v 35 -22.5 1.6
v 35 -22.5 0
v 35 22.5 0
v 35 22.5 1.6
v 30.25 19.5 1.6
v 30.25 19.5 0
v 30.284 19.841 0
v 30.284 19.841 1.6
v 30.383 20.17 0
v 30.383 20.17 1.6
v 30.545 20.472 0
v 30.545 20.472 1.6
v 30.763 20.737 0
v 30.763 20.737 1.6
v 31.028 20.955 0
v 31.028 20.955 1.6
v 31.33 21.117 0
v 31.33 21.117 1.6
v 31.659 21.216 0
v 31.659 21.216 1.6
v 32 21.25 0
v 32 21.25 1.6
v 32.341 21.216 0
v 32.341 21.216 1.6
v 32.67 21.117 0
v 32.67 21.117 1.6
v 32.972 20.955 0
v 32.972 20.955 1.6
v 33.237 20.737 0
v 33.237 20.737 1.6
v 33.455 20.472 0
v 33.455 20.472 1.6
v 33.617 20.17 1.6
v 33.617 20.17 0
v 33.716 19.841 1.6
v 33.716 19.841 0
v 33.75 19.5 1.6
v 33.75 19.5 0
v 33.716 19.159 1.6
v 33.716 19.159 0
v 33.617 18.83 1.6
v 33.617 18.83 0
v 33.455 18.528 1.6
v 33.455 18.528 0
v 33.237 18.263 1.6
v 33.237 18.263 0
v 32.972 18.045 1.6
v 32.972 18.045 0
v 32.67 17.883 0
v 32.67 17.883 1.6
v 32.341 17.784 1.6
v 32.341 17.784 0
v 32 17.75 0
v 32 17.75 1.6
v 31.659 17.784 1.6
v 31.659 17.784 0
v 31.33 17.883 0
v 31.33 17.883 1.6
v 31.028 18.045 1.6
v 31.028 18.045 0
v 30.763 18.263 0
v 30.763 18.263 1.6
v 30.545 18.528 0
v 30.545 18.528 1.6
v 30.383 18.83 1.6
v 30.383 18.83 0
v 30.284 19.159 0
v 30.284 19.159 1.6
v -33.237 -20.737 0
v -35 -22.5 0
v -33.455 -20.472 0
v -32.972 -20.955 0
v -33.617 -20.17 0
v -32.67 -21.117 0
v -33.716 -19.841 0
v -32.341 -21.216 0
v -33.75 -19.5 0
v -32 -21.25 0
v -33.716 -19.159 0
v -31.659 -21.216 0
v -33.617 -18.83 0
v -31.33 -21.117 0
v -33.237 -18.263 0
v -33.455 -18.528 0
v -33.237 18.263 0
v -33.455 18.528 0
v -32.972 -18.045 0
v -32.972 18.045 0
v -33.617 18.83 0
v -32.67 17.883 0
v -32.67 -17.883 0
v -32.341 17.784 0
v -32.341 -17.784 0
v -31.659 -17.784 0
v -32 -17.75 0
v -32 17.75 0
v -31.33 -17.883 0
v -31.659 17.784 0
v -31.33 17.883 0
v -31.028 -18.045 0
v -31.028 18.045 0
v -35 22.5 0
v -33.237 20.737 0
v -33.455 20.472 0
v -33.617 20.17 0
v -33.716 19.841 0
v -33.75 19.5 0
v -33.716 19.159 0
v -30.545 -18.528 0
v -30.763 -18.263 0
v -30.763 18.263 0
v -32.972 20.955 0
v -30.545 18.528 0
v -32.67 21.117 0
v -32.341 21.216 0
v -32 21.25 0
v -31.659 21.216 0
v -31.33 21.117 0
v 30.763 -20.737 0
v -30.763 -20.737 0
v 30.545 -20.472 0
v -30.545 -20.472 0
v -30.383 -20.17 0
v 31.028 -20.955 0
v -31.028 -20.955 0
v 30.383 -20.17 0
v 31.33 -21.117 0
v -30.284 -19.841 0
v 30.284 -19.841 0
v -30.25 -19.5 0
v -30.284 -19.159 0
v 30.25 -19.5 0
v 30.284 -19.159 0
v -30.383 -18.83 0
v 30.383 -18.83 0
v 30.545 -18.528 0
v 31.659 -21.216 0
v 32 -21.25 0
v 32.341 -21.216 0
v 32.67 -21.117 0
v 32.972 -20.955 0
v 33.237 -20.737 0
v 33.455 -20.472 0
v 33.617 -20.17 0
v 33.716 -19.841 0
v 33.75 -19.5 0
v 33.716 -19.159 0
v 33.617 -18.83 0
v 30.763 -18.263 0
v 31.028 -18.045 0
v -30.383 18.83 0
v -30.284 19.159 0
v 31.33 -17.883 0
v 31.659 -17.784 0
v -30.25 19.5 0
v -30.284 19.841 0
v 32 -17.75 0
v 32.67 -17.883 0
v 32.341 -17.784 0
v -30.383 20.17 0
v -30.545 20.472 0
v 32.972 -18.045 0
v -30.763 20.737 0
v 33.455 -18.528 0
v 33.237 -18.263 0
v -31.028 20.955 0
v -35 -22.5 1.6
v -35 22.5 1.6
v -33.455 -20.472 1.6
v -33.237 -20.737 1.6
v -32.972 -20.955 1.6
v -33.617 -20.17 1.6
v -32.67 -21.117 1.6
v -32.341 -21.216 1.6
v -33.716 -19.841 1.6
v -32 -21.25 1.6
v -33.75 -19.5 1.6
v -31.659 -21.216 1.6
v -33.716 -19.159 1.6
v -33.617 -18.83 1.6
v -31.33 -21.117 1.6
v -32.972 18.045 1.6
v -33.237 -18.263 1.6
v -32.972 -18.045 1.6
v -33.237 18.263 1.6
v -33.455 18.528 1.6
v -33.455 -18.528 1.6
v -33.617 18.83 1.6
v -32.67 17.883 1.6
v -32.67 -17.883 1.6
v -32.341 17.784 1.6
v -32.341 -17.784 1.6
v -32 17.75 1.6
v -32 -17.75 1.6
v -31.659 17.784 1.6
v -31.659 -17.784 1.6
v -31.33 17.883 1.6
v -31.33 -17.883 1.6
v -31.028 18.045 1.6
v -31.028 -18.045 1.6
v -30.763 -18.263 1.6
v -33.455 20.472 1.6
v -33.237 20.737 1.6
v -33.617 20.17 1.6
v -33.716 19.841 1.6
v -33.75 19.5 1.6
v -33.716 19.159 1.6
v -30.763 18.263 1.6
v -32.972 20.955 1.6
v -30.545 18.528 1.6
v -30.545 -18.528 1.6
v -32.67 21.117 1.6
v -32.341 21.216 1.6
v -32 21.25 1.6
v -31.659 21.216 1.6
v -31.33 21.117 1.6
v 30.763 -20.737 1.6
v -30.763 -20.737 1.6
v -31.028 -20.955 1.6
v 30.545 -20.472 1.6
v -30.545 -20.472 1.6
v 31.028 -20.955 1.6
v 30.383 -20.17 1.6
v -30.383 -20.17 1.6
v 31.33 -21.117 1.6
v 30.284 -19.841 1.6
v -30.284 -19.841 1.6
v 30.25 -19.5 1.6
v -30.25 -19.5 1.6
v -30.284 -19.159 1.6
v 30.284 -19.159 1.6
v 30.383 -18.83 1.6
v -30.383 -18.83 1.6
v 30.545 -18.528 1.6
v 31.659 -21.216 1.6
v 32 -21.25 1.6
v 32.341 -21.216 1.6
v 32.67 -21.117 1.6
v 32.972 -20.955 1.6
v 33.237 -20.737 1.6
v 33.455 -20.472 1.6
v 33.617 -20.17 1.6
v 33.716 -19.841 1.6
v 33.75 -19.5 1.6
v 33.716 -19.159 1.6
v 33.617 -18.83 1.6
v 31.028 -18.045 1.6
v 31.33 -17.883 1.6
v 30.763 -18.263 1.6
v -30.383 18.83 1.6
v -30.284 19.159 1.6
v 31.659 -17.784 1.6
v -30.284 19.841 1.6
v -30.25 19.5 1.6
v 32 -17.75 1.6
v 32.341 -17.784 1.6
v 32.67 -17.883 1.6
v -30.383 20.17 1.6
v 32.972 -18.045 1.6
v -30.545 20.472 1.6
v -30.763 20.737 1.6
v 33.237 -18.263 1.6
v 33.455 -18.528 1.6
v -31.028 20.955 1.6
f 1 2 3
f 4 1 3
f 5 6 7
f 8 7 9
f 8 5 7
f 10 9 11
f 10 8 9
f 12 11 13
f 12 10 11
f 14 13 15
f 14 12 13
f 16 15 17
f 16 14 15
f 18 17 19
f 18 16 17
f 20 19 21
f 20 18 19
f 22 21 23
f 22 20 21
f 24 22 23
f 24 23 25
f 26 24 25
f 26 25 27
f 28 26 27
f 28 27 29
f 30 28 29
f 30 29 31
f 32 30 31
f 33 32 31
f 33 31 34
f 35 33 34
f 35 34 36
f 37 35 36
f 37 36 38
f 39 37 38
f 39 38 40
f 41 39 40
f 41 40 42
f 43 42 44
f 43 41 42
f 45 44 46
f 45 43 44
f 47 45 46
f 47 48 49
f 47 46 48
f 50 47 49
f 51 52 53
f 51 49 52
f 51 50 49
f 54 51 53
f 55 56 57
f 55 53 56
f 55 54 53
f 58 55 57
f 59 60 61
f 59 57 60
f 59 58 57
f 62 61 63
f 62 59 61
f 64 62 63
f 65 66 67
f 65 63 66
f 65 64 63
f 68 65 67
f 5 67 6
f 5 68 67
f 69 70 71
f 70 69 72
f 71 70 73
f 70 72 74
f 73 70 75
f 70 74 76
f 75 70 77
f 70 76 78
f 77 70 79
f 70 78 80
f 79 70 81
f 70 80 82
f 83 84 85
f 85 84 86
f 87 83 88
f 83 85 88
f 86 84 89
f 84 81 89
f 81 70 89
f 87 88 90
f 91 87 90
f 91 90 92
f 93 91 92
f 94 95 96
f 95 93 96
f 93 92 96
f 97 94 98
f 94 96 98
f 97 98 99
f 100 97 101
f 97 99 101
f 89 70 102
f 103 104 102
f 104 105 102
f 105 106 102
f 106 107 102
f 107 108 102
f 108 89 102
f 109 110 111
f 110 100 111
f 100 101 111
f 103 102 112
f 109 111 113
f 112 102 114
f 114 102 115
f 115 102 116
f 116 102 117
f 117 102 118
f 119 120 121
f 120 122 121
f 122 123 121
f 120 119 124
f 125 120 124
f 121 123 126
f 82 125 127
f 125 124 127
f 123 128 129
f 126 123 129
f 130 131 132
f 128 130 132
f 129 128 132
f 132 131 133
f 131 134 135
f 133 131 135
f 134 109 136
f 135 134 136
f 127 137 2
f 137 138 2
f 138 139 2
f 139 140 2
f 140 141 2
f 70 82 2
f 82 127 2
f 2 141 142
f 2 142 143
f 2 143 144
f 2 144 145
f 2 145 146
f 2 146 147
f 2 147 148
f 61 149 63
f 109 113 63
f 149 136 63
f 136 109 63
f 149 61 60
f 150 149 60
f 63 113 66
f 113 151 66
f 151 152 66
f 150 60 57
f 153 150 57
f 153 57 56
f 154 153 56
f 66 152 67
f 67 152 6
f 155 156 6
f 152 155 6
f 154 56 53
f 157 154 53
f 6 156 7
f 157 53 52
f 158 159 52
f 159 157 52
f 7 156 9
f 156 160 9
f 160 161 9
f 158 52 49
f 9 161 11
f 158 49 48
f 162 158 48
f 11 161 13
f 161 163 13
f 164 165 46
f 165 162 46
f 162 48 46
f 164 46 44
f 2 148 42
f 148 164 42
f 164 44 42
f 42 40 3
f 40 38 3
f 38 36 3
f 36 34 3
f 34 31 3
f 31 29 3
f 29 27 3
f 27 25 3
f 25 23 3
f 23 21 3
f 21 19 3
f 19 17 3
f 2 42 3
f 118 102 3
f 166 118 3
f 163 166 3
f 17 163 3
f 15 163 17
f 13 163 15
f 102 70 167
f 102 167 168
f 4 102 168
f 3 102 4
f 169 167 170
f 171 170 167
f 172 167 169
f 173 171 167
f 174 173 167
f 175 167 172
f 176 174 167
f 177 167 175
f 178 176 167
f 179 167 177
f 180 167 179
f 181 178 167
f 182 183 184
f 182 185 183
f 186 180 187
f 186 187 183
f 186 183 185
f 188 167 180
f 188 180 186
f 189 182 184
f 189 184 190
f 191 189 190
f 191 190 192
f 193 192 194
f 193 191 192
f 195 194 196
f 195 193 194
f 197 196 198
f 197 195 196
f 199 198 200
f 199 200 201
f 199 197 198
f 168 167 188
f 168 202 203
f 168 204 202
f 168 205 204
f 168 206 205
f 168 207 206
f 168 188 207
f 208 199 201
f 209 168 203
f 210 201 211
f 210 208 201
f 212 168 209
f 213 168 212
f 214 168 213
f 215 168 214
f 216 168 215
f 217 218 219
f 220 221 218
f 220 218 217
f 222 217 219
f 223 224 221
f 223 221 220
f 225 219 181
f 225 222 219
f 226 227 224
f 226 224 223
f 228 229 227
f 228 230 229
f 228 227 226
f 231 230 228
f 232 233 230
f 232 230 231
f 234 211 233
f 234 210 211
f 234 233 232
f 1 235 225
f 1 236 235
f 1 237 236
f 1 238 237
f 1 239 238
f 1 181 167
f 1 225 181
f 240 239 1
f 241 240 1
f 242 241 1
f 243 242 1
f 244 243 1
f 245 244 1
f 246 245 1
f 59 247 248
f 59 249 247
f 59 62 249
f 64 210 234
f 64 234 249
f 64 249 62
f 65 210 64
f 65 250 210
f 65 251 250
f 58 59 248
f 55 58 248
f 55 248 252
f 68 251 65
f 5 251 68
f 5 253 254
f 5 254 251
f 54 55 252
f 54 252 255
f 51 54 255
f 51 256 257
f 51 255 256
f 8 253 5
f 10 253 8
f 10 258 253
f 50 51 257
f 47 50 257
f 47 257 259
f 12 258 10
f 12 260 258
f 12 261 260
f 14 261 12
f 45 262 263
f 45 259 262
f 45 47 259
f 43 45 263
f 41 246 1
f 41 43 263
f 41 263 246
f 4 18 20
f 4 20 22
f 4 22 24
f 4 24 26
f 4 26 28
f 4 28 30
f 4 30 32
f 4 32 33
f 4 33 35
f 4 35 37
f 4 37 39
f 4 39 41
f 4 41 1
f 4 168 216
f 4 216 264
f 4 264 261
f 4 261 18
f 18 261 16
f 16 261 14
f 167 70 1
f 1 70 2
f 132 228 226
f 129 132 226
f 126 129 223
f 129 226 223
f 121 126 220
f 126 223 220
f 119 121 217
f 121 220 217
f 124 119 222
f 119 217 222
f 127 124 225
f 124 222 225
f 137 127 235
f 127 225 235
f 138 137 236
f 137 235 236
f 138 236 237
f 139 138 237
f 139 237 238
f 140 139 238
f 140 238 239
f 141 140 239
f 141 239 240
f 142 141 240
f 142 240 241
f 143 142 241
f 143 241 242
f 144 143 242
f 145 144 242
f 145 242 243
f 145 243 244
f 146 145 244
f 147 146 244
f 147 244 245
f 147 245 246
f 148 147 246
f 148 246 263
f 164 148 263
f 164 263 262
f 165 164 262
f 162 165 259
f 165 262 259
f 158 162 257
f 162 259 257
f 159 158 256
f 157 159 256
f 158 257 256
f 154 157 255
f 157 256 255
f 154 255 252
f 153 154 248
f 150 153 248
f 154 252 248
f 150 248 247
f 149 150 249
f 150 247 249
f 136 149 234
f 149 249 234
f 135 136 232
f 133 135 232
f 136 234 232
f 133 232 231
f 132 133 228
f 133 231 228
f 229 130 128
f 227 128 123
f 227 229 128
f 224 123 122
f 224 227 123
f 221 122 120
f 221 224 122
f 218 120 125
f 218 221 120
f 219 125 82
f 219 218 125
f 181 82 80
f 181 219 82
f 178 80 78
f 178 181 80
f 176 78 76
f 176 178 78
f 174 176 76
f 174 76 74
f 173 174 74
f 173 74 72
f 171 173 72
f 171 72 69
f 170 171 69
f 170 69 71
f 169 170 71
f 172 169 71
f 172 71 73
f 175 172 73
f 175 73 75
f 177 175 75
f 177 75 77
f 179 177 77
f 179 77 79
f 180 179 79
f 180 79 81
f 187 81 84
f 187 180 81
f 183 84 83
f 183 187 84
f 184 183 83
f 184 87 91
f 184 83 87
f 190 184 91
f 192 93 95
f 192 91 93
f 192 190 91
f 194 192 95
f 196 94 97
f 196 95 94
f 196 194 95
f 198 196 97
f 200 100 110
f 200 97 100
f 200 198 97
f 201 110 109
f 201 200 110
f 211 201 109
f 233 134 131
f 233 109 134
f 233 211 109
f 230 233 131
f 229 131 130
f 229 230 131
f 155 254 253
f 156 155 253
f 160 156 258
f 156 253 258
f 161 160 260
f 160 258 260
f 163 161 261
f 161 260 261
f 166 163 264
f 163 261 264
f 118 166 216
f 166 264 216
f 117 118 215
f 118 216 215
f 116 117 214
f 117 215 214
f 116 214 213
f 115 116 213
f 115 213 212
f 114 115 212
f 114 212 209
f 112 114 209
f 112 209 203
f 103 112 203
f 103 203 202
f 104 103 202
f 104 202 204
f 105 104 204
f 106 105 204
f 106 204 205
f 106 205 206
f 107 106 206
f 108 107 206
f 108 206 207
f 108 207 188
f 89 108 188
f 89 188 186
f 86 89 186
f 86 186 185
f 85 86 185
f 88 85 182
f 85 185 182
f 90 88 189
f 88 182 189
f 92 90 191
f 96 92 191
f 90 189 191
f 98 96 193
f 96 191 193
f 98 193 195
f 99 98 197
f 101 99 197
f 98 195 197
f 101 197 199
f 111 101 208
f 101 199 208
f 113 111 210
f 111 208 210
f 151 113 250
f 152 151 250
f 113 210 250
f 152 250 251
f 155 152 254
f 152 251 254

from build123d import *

# Parameters (mm, degrees)
SKETCH1_W               = 70
SKETCH1_H               = 45
BOSS_EXTRUDE1_DEPTH     = 1.6
SKETCH2_R               = 1.75
CUT_EXTRUDE1_DEPTH      = 42.639044177
MIRROR2_COPY_1_SKETCH_R = 1.75
MIRROR2_COPY_1_DEPTH    = 42.639044177


with BuildPart() as part:
    # Sketch1 → Boss-Extrude1 (new body)
    with BuildSketch(Plane.XY):
        Rectangle(SKETCH1_W, SKETCH1_H)
    extrude(amount=BOSS_EXTRUDE1_DEPTH)

    # Sketch2 → Cut-Extrude1 (cut, through all)
    with BuildSketch(Plane.XY.offset(1.6)):
        with Locations((-32, 19.5)):
            Circle(SKETCH2_R)
    cut_extrude1 = extrude(amount=-CUT_EXTRUDE1_DEPTH, mode=Mode.SUBTRACT)

    # Mirror1: Cut-Extrude1 across plane
    add(cut_extrude1.mirror(Plane.ZX), mode=Mode.SUBTRACT)

    # Mirror2: Cut-Extrude1 across plane
    add(cut_extrude1.mirror(Plane(origin=(0, 0, 0), x_dir=(0, 0, 1), z_dir=(1, 0, 0))), mode=Mode.SUBTRACT)

    # Mirror2 copy 1 sketch → Mirror2 copy 1 (cut, through all)
    with BuildSketch(Plane(origin=(0, 0, 1.6), x_dir=(-1, 0, 0), z_dir=(0, 0, 1))):
        with Locations((-32, 19.5)):
            Circle(MIRROR2_COPY_1_SKETCH_R)
    extrude(amount=-MIRROR2_COPY_1_DEPTH, mode=Mode.SUBTRACT)


solid = part.part
